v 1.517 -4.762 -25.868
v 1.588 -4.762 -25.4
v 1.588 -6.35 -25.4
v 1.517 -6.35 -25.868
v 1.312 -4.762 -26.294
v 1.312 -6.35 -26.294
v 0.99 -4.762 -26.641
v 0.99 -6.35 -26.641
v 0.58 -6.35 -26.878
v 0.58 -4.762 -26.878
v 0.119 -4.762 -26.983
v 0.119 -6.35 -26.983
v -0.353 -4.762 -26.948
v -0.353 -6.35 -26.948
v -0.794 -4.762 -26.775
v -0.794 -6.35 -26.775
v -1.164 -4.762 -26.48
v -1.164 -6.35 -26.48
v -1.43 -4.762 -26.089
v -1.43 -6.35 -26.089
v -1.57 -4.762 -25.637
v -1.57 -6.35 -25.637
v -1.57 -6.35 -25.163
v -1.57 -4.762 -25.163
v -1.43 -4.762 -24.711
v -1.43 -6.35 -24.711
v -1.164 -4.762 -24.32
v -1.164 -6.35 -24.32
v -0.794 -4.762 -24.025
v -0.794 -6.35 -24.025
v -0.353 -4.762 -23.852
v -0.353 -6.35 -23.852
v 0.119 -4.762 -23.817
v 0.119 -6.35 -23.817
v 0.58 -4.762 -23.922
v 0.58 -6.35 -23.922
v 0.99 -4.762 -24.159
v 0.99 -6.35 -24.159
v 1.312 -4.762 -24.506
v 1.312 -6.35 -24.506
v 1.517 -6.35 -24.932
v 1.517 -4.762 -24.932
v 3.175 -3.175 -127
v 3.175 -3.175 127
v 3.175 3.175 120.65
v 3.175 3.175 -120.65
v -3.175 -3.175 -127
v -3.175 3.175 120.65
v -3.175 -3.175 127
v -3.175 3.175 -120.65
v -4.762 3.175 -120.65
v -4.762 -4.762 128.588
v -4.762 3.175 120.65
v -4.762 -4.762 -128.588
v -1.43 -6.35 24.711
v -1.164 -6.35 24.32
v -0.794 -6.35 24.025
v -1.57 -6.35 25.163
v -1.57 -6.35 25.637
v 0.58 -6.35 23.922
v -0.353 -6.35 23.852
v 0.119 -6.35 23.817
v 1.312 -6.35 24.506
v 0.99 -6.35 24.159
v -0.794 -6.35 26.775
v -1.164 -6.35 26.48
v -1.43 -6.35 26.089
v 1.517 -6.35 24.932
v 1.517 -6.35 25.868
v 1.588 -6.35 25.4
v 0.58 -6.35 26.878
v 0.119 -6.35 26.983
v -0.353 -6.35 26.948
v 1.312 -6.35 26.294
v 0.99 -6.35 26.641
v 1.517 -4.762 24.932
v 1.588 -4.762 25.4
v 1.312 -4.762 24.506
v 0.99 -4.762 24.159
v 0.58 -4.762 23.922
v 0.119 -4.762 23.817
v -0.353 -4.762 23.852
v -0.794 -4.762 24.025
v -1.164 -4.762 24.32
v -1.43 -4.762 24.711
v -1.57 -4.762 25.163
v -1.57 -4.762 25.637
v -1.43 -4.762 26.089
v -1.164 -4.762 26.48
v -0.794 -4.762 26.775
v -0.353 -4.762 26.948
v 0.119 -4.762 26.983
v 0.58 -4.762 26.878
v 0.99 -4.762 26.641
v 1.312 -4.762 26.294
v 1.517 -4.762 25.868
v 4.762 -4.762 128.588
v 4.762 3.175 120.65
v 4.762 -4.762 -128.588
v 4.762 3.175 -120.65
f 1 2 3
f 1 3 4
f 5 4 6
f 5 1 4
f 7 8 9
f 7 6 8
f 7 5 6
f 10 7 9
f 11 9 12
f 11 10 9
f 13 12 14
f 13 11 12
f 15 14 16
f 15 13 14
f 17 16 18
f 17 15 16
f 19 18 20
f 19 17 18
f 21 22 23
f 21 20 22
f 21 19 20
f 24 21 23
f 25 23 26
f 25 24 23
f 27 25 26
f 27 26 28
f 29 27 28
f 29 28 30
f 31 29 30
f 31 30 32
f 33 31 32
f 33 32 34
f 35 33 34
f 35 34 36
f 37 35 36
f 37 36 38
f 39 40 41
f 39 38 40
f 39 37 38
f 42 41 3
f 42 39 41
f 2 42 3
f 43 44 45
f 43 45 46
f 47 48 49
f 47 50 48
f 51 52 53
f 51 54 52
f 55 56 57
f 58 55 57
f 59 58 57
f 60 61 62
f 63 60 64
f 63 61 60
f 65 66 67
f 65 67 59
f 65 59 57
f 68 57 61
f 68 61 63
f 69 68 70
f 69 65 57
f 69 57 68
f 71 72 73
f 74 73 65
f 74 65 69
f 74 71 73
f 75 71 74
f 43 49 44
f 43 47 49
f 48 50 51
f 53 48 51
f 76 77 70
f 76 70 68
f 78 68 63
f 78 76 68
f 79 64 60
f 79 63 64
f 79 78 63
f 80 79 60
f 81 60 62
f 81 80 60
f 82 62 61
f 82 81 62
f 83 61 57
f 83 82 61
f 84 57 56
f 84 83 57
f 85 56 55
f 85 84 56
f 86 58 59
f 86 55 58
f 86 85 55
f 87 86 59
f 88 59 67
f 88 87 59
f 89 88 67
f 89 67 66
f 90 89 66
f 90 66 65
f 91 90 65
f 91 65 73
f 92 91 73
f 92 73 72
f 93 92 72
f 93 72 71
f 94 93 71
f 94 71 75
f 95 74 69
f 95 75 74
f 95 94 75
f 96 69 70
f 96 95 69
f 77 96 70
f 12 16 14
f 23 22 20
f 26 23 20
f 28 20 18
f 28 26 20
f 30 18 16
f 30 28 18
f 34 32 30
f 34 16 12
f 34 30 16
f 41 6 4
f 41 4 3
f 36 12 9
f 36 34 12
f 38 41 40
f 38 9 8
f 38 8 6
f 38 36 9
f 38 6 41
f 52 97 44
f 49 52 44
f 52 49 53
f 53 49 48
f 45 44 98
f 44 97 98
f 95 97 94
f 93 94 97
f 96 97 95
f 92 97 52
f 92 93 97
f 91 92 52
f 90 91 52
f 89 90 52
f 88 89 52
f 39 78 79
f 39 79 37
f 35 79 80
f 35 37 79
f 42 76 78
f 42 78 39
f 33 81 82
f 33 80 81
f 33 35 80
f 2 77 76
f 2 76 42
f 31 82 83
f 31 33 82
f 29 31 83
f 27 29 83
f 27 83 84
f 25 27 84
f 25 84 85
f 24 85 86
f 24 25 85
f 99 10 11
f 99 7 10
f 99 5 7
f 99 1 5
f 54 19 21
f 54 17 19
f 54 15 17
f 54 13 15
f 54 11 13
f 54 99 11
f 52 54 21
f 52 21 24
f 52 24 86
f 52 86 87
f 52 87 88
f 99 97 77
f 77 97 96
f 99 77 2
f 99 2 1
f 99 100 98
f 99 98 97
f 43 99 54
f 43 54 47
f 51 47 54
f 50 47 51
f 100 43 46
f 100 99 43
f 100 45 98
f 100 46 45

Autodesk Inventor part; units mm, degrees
ref_plane "YZ Plane" through (0, 0, 0) normal (1, 0, 0) x (0, 1, 0)
ref_plane "XZ Plane" through (0, 0, 0) normal (0, 1, 0) x (-1, 0, 0)
ref_plane "XY Plane" through (0, 0, 0) normal (0, 0, 1) x (1, 0, 0)
sketch "Sketch1" plane through (0, 0, 0) normal (0, 0, 1) x (1, 0, 0)
  line L0 (-6.6675, 0) -> (6.6675, 0) projected
  line L1 (0, -6.35) -> (0, 4.7625) projected
  line L2 (-3.175, 3.175) -> (-3.175, -3.175)
  line L3 (-3.175, -3.175) -> (3.175, -3.175)
  line L4 (3.175, -3.175) -> (3.175, 3.175)
  line L5 (4.7625, 3.175) -> (4.7625, -4.7625)
  line L6 (4.7625, -4.7625) -> (-4.7625, -4.7625)
  line L7 (-4.7625, -4.7625) -> (-4.7625, 3.175)
  line L8 (-3.175, 3.175) -> (-4.7625, 3.175)
  line L9 (3.175, 3.175) -> (4.7625, 3.175)
  point P0 (0, 0)
  point P1 (0, -3.175)
  point P2 (-3.175, 0)
  dimension "d0" = 1.5875
  dimension "d1" = 6.35
  dimension "d2" = 6.35
extrude "Extrusion1" add sketch "Sketch1" along normal mid plane 257.175 contours L7 L8 L2 L0 | L0 L2 L3 L1 L6 L7 | L1 L3 L4 L0 L5 L6 | L4 L9 L5 L0
sketch "Sketch2" plane through (4.7625, -4.7625, 128.5875) normal (1, 0, 0) x (0, 0, -1)
  line L0 (0, 7.9375) -> (0, 0) projected
  line L1 (0, 0) -> (257.175, 0) projected
  line L2 (0, 7.9375) -> (257.175, 7.9375) projected
  line L3 (0, 0) -> (7.9375, 7.9375)
  line L4 (7.9375, 7.9375) -> (0, 7.9375)
  line L5 (0, 7.9375) -> (0, 0)
  line L6 (128.5875, 7.9375) -> (128.5875, 0) construction
  line L7 (257.175, 7.9375) -> (257.175, 0)
  line L8 (257.175, 0) -> (249.2375, 7.9375)
  line L9 (257.175, 7.9375) -> (249.2375, 7.9375)
  line L10 (7.9375, 7.9375) -> (0, 7.9375)
  point P0 (128.5875, 4.7625)
  dimension "d5" = 45
extrude "Extrusion2" cut sketch "Sketch2" against normal through all contours L2 L3 L0 | L8 L2 L7
sketch "Sketch4" plane through (-4.7625, -4.7625, 128.5875) normal (0, -1, 0) x (1, 0, 0)
  circle A0 centre (4.7625, -103.1875) radius 1.5875
  circle A1 centre (4.7625, -153.9875) radius 1.5875
  point P0 (4.7625, -128.5875)
  dimension "d12" = 3.175
  dimension "d13" = 25.4
  dimension "d14" = 25.4
extrude "Extrusion4" add sketch "Sketch4" along normal blind 1.5875
equation "\"d14\" = d13"
properties part number "c-channel template" material "Aluminum-6061"
